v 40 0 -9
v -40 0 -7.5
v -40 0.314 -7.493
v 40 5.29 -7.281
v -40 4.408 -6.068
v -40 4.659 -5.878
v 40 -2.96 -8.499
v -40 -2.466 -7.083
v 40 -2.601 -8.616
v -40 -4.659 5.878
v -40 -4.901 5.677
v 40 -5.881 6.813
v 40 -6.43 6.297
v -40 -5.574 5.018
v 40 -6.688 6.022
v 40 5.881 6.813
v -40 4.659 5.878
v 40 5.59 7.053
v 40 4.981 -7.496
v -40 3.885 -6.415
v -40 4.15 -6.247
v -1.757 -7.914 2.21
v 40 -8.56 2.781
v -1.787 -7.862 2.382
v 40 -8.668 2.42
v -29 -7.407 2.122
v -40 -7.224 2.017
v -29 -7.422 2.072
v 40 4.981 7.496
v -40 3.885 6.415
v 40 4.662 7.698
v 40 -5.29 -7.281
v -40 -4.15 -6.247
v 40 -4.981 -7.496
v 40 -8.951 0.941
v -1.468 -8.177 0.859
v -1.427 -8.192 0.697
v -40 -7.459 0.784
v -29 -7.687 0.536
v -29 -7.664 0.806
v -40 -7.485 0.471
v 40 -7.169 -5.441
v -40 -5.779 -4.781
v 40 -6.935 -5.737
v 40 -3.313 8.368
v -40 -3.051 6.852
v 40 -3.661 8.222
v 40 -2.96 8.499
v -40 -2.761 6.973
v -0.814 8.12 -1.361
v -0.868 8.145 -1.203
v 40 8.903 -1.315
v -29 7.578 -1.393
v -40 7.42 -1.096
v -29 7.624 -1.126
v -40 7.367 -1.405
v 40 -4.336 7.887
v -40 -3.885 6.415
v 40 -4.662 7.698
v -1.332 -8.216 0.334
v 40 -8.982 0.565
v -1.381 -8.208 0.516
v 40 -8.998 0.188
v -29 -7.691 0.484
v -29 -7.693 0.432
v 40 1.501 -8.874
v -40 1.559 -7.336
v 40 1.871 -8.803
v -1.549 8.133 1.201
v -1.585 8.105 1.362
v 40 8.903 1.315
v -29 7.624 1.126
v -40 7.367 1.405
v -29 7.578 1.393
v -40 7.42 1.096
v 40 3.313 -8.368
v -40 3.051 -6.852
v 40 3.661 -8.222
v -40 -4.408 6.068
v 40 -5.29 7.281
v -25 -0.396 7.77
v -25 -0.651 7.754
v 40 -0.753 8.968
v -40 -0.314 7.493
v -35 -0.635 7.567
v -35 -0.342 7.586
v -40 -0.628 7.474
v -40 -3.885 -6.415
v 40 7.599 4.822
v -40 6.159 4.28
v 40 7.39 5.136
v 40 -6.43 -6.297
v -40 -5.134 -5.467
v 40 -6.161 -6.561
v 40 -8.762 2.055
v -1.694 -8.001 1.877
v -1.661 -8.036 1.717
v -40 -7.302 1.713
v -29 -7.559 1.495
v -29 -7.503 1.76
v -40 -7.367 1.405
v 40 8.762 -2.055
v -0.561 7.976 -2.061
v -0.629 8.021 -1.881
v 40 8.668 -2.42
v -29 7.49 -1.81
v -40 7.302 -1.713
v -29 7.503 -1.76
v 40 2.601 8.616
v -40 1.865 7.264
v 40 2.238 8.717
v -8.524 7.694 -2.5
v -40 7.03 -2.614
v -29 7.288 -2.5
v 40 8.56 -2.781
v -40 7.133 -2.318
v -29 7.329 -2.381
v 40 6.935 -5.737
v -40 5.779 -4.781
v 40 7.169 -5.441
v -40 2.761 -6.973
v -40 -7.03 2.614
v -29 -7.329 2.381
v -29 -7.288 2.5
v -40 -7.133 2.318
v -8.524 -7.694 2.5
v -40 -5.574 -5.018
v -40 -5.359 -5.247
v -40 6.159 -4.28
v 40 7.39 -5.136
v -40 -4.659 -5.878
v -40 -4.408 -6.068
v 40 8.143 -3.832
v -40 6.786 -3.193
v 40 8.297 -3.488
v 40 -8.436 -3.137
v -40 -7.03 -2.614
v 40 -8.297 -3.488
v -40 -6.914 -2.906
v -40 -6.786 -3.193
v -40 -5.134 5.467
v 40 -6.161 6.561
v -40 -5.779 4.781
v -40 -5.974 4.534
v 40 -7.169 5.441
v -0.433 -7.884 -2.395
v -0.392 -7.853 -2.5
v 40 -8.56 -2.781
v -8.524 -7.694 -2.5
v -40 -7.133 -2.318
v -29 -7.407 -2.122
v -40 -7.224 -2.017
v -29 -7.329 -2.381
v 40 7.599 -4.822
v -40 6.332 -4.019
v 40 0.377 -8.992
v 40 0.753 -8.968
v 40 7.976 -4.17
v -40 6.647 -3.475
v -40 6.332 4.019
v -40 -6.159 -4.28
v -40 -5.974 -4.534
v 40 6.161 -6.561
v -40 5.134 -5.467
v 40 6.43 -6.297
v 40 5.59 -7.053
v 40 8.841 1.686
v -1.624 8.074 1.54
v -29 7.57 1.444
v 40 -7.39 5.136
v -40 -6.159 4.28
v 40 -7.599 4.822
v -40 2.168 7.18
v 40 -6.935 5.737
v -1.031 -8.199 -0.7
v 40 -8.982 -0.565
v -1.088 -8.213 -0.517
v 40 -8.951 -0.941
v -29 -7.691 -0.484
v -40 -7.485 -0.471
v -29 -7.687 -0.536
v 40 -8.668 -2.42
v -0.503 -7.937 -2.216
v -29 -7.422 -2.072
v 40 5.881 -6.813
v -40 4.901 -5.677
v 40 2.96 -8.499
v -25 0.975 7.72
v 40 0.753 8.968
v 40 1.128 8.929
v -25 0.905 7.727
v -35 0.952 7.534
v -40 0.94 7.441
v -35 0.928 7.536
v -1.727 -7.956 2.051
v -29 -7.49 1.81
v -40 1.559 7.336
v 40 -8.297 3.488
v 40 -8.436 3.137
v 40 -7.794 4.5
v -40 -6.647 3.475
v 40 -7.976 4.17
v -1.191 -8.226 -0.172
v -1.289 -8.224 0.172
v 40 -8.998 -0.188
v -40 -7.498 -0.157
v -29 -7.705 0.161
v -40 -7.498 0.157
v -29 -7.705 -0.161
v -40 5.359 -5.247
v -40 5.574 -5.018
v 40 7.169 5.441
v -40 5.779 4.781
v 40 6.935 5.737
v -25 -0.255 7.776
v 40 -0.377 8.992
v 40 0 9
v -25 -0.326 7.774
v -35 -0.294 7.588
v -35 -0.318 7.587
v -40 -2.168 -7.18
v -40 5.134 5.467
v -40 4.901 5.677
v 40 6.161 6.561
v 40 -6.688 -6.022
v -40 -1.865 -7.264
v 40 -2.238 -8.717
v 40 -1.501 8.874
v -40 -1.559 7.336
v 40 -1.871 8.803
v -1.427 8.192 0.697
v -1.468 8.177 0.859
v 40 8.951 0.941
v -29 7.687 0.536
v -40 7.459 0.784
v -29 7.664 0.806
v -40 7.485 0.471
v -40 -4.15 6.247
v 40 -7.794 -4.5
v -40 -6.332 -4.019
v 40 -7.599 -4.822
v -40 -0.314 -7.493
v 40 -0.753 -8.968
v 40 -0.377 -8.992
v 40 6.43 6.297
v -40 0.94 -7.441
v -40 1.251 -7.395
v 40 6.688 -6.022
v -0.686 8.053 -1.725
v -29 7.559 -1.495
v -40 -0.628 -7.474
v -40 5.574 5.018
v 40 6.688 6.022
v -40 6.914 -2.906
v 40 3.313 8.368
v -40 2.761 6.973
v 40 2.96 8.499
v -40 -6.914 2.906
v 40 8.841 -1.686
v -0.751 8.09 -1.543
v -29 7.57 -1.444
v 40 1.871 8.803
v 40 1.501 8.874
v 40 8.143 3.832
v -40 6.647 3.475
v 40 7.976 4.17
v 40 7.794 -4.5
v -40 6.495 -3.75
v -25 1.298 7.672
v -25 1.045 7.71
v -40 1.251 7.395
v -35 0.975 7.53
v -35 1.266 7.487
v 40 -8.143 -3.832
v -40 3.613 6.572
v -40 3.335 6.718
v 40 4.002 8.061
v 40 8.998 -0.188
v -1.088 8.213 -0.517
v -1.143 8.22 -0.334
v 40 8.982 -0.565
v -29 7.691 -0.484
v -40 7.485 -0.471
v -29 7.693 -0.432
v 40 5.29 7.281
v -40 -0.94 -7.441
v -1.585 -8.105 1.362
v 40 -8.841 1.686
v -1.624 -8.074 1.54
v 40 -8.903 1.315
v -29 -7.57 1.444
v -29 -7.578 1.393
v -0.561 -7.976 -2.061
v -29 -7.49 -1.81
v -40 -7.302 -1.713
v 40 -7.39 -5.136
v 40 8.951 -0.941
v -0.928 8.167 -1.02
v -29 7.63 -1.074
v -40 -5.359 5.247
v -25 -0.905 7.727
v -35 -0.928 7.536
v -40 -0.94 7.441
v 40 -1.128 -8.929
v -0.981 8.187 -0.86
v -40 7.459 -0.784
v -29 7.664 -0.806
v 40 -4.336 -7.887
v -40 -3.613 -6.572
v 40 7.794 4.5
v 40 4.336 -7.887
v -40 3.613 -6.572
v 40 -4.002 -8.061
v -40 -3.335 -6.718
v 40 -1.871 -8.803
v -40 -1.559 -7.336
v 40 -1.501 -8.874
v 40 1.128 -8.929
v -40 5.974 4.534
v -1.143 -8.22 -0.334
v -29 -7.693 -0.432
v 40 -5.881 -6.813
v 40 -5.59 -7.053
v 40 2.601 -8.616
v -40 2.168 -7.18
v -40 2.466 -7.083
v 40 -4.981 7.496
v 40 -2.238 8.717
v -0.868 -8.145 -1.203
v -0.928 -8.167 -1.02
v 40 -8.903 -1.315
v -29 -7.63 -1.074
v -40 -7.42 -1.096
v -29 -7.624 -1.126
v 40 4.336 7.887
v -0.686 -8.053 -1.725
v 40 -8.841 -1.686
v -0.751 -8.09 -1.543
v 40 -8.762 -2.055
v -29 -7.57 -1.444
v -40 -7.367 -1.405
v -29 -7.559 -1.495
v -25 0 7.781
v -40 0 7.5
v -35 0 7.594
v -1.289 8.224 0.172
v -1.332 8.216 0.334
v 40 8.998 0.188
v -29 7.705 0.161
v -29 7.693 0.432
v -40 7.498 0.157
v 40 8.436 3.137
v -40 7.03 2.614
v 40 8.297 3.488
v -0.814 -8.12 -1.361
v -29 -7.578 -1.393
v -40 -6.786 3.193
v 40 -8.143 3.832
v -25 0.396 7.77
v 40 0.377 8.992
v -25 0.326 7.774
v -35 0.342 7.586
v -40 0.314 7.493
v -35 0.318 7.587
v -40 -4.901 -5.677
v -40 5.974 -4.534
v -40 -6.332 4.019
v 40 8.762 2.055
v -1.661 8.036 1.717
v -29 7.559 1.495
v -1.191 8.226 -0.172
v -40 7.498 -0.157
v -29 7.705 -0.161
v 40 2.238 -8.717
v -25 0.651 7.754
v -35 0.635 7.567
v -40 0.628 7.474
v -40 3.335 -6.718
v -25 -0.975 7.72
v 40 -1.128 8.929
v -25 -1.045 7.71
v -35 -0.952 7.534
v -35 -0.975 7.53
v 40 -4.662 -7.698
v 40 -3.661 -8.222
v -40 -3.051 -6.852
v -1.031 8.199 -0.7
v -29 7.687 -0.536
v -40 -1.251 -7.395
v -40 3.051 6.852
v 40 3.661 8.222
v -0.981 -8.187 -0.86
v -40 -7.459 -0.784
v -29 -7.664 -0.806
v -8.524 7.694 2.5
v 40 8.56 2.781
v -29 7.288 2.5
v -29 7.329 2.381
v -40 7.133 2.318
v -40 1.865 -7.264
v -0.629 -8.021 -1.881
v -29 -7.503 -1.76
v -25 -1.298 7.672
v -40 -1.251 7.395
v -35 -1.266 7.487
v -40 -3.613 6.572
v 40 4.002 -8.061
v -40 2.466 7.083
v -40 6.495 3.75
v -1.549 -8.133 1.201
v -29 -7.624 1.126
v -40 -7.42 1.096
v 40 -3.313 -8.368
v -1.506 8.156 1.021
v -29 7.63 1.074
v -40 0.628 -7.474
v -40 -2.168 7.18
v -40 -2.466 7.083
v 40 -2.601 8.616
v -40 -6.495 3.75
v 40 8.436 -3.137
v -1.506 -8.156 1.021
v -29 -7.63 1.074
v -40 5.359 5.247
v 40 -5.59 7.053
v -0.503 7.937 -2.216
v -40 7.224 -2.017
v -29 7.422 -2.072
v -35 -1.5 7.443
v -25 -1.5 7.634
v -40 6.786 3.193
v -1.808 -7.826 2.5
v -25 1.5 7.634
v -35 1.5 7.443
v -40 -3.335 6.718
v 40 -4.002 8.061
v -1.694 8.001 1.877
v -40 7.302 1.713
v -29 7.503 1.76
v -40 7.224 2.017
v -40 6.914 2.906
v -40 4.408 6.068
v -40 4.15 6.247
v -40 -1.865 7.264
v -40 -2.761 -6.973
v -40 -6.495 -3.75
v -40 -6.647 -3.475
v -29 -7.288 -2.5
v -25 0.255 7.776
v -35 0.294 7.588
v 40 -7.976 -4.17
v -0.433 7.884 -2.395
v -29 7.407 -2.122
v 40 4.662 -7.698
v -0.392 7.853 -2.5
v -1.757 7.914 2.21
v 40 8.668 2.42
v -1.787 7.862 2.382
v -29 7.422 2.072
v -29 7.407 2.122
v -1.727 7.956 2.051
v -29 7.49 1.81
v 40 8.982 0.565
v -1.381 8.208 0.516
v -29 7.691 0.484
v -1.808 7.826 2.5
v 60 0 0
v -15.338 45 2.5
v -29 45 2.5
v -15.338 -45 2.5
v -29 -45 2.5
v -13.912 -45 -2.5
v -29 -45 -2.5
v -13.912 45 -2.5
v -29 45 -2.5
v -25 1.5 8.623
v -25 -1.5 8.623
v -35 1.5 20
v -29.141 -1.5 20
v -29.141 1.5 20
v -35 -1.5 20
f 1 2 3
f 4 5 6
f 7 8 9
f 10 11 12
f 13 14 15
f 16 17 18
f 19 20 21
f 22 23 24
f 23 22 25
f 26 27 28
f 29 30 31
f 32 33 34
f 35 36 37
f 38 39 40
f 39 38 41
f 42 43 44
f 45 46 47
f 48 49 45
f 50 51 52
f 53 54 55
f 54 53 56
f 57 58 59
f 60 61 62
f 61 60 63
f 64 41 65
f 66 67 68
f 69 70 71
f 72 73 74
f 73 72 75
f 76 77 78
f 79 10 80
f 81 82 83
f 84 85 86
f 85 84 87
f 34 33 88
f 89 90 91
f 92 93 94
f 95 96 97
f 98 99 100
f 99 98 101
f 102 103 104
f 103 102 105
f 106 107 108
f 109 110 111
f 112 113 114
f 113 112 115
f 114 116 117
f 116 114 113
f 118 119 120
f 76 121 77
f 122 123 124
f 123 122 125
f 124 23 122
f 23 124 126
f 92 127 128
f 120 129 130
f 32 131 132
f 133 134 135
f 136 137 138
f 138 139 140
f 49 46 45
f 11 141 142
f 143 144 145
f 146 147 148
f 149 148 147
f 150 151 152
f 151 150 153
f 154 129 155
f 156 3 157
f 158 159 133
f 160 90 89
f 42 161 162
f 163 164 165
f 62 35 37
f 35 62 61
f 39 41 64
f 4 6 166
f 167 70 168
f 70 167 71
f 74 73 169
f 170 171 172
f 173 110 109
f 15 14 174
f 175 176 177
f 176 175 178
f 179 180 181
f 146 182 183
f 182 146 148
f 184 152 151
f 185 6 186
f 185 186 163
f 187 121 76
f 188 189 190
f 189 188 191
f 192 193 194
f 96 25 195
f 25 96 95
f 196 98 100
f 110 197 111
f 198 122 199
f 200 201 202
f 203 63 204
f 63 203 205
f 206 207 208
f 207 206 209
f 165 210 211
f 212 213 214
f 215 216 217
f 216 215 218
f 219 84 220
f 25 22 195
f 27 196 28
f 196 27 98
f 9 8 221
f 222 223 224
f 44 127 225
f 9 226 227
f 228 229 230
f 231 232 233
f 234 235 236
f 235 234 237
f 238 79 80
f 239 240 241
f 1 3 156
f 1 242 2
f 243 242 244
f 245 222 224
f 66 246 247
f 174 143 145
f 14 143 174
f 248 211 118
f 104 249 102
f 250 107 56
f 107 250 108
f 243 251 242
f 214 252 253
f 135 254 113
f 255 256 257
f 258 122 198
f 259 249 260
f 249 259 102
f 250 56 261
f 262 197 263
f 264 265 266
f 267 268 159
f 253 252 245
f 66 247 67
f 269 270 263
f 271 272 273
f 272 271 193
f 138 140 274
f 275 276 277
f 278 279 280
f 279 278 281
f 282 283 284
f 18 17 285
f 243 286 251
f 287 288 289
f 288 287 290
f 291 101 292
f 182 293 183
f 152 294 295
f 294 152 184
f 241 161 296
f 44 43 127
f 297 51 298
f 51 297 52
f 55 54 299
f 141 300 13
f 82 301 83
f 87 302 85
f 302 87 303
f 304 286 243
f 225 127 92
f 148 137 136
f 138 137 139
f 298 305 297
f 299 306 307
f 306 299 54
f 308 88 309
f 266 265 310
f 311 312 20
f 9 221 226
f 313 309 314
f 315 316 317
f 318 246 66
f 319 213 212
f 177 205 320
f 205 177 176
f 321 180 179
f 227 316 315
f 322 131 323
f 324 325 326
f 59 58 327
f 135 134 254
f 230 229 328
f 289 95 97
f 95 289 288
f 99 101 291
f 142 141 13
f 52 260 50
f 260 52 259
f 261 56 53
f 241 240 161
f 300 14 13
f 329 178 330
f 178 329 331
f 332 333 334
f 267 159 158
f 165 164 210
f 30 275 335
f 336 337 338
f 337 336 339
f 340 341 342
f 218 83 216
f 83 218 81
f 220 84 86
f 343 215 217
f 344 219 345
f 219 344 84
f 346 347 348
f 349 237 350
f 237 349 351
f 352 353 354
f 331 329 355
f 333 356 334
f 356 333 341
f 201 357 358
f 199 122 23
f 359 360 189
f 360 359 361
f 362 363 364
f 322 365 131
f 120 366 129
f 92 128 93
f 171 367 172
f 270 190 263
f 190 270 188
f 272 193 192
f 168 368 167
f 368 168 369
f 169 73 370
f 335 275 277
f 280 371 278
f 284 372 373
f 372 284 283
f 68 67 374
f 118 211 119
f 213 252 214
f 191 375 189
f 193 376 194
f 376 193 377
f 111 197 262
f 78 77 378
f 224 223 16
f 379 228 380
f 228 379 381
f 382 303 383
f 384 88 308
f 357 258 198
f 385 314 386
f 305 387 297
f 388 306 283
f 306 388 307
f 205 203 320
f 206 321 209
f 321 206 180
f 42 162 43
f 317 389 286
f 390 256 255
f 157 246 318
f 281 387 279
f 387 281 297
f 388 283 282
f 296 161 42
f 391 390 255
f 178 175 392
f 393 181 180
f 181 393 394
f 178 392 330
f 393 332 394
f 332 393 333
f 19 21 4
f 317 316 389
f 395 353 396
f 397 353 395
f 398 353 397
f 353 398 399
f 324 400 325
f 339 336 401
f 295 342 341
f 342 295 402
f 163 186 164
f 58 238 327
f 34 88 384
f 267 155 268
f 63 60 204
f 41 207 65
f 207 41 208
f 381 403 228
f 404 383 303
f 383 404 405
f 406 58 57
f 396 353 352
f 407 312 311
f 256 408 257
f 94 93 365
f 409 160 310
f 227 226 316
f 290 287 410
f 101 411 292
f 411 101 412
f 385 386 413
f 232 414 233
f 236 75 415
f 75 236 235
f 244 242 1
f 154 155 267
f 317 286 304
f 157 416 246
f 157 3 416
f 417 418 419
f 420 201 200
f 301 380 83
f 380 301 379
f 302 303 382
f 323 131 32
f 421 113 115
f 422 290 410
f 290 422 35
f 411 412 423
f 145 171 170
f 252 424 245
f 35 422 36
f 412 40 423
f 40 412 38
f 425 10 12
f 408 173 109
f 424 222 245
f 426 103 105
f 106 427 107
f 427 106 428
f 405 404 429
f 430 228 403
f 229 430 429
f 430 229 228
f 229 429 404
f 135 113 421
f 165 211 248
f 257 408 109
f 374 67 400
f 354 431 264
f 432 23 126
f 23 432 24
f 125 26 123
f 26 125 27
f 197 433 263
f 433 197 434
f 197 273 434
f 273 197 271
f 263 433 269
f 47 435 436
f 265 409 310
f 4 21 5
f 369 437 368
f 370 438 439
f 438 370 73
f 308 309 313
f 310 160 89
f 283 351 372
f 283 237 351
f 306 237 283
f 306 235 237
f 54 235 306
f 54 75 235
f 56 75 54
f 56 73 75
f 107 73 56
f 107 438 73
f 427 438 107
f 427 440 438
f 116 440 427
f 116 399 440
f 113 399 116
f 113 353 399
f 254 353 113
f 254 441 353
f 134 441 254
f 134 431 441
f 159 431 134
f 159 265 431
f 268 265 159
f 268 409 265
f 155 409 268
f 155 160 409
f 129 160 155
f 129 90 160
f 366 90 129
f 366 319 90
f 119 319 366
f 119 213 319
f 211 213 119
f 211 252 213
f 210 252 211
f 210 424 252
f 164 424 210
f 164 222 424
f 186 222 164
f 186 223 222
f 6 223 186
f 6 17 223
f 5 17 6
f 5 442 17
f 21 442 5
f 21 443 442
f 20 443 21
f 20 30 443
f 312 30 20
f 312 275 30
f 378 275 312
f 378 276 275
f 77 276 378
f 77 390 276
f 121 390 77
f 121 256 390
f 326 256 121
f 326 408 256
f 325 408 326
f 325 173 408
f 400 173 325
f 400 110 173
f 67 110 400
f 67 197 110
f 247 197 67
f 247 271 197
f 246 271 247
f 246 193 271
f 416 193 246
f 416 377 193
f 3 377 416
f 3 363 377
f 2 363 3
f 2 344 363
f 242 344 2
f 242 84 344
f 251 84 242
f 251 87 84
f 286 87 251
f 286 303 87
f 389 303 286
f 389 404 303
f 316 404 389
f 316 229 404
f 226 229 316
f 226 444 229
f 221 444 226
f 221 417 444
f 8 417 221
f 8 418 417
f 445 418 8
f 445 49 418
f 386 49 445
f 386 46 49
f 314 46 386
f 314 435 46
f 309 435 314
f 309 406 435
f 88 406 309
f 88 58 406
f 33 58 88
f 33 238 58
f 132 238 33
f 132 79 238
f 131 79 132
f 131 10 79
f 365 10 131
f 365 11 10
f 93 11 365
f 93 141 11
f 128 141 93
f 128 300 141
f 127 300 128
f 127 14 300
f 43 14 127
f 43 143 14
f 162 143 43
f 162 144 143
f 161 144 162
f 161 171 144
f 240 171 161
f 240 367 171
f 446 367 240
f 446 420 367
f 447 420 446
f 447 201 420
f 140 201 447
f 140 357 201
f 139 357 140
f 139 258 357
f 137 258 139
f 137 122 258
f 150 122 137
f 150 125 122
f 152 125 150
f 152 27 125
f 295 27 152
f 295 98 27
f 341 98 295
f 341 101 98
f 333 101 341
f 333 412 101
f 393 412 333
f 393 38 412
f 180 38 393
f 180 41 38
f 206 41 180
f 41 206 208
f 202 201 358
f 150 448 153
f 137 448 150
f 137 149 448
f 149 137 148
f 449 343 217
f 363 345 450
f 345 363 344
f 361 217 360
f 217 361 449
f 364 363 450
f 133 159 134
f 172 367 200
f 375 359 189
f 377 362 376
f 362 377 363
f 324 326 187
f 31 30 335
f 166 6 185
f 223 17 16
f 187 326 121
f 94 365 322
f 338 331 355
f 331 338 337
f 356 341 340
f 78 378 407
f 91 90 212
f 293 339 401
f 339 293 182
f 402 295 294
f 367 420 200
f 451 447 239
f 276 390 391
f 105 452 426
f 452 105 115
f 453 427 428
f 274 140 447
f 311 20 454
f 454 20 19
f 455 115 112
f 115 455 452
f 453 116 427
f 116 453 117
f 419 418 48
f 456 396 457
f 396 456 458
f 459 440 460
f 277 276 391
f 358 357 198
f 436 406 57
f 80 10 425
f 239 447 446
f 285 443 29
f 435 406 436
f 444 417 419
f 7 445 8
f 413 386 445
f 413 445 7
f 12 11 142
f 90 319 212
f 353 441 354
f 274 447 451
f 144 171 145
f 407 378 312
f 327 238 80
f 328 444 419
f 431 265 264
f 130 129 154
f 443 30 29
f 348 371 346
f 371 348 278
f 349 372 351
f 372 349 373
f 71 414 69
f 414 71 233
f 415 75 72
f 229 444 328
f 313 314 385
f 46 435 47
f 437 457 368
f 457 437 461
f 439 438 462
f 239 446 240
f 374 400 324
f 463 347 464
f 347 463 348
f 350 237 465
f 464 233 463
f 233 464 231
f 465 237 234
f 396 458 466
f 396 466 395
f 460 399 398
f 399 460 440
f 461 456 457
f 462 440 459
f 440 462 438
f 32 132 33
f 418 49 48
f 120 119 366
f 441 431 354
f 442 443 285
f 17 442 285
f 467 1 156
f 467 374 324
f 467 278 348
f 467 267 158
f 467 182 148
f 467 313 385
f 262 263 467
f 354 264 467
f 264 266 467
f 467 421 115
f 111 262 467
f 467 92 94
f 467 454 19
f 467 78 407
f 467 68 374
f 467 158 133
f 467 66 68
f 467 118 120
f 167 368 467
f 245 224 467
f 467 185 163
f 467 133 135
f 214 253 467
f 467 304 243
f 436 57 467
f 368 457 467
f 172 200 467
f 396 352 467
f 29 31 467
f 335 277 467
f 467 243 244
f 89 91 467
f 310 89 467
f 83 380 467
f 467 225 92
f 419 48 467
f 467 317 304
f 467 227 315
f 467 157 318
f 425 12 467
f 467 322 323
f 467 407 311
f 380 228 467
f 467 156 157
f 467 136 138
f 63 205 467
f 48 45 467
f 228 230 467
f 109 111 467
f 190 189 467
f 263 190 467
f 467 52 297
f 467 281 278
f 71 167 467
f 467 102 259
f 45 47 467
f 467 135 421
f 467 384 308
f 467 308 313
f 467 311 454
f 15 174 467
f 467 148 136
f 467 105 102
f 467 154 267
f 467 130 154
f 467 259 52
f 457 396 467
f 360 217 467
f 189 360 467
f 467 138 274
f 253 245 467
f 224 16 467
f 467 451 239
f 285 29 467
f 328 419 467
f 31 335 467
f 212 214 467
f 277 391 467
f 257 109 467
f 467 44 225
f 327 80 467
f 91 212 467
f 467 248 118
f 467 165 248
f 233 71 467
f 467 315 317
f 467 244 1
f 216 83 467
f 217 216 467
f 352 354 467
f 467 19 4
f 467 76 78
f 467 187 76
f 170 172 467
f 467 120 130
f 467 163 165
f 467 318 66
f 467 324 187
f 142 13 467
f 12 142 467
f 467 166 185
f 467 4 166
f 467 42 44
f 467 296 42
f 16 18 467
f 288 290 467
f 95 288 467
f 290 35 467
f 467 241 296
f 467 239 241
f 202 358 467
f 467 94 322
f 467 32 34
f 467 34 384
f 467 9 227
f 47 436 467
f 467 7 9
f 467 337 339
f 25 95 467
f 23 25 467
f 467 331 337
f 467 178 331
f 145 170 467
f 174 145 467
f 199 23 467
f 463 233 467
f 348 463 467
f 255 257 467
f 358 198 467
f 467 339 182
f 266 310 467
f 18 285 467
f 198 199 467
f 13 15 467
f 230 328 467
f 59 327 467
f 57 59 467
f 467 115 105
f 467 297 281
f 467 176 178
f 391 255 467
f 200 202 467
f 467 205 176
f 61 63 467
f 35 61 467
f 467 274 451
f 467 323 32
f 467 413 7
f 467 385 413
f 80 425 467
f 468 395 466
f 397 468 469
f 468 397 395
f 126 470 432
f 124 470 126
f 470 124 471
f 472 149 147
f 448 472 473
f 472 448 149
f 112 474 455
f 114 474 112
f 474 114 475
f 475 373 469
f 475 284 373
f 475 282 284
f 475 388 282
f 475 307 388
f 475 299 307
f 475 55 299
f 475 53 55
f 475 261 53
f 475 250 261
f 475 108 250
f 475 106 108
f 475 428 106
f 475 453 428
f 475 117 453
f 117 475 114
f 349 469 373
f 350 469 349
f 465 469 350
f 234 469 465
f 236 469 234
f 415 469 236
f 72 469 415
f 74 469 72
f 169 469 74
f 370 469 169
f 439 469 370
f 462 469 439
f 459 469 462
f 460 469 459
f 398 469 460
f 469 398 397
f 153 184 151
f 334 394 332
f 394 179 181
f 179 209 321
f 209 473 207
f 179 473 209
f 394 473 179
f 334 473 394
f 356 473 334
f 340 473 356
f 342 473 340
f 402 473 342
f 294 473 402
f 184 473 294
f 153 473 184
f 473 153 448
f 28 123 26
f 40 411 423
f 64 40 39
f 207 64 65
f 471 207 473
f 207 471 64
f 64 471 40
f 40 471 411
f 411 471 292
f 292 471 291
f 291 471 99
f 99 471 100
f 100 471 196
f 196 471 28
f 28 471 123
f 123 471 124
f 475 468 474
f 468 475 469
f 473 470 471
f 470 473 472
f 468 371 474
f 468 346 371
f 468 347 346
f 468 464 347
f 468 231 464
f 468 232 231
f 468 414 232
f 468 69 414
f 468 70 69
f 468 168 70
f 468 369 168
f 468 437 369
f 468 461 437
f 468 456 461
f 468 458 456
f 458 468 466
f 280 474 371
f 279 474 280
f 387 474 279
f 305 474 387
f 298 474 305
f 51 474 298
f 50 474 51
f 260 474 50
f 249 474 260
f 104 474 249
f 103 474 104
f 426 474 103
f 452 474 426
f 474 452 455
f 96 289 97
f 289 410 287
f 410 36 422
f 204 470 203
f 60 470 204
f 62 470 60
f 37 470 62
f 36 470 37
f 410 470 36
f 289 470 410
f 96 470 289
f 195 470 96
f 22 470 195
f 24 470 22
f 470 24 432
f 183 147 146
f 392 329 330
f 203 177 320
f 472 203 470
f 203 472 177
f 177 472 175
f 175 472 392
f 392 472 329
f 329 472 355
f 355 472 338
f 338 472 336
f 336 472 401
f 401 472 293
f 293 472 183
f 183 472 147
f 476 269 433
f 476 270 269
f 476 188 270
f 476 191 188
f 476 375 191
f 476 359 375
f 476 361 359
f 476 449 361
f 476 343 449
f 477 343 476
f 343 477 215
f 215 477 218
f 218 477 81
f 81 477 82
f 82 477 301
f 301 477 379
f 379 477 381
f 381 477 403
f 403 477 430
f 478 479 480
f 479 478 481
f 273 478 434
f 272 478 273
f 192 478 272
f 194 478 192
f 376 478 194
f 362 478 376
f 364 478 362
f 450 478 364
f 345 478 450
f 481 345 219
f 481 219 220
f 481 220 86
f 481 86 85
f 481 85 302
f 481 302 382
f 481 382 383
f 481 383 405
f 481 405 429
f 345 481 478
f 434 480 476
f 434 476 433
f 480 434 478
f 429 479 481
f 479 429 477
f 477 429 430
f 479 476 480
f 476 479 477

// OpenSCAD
// Filename : Plane.scad
// Version  : v1.0
// Modified : 5 Sept 2016
// Author   : Jason Yeo
//////////////////////////////////////
// Plane
//////////////////////////////////////

$fn=150;
plane();

module plane(body_length=100, wing_span=90)
{
	body(body_length);
	translate([-14,0,0])wings(wing_span);
	translate([-30,0,10])tail();
}

module body(length=100)
{
	translate([0,0,0])rotate([0,90,0])cylinder(h=length*.8, d1=15, d2=18, center=true);
	translate([length/2,0,0])rotate([0,90,0])cylinder(h=length*.2, d1=18, d2=0, center=true);
}

module wings(span)
{
	difference()
	{
		cube([span/3,span,5], true);
		translate([25,+20,0])rotate([0,-15,+20])cube([span/3,span,15], true);
		translate([25,-20,0])rotate([0,-15,-20])cube([span/3,span,15], true);
	}
}

module tail()
{
	difference()
	{
		cube([10,3,20], true);
		translate([8,0,5])rotate([0,-20,0])cube([10,3,20], true);
	}
}
